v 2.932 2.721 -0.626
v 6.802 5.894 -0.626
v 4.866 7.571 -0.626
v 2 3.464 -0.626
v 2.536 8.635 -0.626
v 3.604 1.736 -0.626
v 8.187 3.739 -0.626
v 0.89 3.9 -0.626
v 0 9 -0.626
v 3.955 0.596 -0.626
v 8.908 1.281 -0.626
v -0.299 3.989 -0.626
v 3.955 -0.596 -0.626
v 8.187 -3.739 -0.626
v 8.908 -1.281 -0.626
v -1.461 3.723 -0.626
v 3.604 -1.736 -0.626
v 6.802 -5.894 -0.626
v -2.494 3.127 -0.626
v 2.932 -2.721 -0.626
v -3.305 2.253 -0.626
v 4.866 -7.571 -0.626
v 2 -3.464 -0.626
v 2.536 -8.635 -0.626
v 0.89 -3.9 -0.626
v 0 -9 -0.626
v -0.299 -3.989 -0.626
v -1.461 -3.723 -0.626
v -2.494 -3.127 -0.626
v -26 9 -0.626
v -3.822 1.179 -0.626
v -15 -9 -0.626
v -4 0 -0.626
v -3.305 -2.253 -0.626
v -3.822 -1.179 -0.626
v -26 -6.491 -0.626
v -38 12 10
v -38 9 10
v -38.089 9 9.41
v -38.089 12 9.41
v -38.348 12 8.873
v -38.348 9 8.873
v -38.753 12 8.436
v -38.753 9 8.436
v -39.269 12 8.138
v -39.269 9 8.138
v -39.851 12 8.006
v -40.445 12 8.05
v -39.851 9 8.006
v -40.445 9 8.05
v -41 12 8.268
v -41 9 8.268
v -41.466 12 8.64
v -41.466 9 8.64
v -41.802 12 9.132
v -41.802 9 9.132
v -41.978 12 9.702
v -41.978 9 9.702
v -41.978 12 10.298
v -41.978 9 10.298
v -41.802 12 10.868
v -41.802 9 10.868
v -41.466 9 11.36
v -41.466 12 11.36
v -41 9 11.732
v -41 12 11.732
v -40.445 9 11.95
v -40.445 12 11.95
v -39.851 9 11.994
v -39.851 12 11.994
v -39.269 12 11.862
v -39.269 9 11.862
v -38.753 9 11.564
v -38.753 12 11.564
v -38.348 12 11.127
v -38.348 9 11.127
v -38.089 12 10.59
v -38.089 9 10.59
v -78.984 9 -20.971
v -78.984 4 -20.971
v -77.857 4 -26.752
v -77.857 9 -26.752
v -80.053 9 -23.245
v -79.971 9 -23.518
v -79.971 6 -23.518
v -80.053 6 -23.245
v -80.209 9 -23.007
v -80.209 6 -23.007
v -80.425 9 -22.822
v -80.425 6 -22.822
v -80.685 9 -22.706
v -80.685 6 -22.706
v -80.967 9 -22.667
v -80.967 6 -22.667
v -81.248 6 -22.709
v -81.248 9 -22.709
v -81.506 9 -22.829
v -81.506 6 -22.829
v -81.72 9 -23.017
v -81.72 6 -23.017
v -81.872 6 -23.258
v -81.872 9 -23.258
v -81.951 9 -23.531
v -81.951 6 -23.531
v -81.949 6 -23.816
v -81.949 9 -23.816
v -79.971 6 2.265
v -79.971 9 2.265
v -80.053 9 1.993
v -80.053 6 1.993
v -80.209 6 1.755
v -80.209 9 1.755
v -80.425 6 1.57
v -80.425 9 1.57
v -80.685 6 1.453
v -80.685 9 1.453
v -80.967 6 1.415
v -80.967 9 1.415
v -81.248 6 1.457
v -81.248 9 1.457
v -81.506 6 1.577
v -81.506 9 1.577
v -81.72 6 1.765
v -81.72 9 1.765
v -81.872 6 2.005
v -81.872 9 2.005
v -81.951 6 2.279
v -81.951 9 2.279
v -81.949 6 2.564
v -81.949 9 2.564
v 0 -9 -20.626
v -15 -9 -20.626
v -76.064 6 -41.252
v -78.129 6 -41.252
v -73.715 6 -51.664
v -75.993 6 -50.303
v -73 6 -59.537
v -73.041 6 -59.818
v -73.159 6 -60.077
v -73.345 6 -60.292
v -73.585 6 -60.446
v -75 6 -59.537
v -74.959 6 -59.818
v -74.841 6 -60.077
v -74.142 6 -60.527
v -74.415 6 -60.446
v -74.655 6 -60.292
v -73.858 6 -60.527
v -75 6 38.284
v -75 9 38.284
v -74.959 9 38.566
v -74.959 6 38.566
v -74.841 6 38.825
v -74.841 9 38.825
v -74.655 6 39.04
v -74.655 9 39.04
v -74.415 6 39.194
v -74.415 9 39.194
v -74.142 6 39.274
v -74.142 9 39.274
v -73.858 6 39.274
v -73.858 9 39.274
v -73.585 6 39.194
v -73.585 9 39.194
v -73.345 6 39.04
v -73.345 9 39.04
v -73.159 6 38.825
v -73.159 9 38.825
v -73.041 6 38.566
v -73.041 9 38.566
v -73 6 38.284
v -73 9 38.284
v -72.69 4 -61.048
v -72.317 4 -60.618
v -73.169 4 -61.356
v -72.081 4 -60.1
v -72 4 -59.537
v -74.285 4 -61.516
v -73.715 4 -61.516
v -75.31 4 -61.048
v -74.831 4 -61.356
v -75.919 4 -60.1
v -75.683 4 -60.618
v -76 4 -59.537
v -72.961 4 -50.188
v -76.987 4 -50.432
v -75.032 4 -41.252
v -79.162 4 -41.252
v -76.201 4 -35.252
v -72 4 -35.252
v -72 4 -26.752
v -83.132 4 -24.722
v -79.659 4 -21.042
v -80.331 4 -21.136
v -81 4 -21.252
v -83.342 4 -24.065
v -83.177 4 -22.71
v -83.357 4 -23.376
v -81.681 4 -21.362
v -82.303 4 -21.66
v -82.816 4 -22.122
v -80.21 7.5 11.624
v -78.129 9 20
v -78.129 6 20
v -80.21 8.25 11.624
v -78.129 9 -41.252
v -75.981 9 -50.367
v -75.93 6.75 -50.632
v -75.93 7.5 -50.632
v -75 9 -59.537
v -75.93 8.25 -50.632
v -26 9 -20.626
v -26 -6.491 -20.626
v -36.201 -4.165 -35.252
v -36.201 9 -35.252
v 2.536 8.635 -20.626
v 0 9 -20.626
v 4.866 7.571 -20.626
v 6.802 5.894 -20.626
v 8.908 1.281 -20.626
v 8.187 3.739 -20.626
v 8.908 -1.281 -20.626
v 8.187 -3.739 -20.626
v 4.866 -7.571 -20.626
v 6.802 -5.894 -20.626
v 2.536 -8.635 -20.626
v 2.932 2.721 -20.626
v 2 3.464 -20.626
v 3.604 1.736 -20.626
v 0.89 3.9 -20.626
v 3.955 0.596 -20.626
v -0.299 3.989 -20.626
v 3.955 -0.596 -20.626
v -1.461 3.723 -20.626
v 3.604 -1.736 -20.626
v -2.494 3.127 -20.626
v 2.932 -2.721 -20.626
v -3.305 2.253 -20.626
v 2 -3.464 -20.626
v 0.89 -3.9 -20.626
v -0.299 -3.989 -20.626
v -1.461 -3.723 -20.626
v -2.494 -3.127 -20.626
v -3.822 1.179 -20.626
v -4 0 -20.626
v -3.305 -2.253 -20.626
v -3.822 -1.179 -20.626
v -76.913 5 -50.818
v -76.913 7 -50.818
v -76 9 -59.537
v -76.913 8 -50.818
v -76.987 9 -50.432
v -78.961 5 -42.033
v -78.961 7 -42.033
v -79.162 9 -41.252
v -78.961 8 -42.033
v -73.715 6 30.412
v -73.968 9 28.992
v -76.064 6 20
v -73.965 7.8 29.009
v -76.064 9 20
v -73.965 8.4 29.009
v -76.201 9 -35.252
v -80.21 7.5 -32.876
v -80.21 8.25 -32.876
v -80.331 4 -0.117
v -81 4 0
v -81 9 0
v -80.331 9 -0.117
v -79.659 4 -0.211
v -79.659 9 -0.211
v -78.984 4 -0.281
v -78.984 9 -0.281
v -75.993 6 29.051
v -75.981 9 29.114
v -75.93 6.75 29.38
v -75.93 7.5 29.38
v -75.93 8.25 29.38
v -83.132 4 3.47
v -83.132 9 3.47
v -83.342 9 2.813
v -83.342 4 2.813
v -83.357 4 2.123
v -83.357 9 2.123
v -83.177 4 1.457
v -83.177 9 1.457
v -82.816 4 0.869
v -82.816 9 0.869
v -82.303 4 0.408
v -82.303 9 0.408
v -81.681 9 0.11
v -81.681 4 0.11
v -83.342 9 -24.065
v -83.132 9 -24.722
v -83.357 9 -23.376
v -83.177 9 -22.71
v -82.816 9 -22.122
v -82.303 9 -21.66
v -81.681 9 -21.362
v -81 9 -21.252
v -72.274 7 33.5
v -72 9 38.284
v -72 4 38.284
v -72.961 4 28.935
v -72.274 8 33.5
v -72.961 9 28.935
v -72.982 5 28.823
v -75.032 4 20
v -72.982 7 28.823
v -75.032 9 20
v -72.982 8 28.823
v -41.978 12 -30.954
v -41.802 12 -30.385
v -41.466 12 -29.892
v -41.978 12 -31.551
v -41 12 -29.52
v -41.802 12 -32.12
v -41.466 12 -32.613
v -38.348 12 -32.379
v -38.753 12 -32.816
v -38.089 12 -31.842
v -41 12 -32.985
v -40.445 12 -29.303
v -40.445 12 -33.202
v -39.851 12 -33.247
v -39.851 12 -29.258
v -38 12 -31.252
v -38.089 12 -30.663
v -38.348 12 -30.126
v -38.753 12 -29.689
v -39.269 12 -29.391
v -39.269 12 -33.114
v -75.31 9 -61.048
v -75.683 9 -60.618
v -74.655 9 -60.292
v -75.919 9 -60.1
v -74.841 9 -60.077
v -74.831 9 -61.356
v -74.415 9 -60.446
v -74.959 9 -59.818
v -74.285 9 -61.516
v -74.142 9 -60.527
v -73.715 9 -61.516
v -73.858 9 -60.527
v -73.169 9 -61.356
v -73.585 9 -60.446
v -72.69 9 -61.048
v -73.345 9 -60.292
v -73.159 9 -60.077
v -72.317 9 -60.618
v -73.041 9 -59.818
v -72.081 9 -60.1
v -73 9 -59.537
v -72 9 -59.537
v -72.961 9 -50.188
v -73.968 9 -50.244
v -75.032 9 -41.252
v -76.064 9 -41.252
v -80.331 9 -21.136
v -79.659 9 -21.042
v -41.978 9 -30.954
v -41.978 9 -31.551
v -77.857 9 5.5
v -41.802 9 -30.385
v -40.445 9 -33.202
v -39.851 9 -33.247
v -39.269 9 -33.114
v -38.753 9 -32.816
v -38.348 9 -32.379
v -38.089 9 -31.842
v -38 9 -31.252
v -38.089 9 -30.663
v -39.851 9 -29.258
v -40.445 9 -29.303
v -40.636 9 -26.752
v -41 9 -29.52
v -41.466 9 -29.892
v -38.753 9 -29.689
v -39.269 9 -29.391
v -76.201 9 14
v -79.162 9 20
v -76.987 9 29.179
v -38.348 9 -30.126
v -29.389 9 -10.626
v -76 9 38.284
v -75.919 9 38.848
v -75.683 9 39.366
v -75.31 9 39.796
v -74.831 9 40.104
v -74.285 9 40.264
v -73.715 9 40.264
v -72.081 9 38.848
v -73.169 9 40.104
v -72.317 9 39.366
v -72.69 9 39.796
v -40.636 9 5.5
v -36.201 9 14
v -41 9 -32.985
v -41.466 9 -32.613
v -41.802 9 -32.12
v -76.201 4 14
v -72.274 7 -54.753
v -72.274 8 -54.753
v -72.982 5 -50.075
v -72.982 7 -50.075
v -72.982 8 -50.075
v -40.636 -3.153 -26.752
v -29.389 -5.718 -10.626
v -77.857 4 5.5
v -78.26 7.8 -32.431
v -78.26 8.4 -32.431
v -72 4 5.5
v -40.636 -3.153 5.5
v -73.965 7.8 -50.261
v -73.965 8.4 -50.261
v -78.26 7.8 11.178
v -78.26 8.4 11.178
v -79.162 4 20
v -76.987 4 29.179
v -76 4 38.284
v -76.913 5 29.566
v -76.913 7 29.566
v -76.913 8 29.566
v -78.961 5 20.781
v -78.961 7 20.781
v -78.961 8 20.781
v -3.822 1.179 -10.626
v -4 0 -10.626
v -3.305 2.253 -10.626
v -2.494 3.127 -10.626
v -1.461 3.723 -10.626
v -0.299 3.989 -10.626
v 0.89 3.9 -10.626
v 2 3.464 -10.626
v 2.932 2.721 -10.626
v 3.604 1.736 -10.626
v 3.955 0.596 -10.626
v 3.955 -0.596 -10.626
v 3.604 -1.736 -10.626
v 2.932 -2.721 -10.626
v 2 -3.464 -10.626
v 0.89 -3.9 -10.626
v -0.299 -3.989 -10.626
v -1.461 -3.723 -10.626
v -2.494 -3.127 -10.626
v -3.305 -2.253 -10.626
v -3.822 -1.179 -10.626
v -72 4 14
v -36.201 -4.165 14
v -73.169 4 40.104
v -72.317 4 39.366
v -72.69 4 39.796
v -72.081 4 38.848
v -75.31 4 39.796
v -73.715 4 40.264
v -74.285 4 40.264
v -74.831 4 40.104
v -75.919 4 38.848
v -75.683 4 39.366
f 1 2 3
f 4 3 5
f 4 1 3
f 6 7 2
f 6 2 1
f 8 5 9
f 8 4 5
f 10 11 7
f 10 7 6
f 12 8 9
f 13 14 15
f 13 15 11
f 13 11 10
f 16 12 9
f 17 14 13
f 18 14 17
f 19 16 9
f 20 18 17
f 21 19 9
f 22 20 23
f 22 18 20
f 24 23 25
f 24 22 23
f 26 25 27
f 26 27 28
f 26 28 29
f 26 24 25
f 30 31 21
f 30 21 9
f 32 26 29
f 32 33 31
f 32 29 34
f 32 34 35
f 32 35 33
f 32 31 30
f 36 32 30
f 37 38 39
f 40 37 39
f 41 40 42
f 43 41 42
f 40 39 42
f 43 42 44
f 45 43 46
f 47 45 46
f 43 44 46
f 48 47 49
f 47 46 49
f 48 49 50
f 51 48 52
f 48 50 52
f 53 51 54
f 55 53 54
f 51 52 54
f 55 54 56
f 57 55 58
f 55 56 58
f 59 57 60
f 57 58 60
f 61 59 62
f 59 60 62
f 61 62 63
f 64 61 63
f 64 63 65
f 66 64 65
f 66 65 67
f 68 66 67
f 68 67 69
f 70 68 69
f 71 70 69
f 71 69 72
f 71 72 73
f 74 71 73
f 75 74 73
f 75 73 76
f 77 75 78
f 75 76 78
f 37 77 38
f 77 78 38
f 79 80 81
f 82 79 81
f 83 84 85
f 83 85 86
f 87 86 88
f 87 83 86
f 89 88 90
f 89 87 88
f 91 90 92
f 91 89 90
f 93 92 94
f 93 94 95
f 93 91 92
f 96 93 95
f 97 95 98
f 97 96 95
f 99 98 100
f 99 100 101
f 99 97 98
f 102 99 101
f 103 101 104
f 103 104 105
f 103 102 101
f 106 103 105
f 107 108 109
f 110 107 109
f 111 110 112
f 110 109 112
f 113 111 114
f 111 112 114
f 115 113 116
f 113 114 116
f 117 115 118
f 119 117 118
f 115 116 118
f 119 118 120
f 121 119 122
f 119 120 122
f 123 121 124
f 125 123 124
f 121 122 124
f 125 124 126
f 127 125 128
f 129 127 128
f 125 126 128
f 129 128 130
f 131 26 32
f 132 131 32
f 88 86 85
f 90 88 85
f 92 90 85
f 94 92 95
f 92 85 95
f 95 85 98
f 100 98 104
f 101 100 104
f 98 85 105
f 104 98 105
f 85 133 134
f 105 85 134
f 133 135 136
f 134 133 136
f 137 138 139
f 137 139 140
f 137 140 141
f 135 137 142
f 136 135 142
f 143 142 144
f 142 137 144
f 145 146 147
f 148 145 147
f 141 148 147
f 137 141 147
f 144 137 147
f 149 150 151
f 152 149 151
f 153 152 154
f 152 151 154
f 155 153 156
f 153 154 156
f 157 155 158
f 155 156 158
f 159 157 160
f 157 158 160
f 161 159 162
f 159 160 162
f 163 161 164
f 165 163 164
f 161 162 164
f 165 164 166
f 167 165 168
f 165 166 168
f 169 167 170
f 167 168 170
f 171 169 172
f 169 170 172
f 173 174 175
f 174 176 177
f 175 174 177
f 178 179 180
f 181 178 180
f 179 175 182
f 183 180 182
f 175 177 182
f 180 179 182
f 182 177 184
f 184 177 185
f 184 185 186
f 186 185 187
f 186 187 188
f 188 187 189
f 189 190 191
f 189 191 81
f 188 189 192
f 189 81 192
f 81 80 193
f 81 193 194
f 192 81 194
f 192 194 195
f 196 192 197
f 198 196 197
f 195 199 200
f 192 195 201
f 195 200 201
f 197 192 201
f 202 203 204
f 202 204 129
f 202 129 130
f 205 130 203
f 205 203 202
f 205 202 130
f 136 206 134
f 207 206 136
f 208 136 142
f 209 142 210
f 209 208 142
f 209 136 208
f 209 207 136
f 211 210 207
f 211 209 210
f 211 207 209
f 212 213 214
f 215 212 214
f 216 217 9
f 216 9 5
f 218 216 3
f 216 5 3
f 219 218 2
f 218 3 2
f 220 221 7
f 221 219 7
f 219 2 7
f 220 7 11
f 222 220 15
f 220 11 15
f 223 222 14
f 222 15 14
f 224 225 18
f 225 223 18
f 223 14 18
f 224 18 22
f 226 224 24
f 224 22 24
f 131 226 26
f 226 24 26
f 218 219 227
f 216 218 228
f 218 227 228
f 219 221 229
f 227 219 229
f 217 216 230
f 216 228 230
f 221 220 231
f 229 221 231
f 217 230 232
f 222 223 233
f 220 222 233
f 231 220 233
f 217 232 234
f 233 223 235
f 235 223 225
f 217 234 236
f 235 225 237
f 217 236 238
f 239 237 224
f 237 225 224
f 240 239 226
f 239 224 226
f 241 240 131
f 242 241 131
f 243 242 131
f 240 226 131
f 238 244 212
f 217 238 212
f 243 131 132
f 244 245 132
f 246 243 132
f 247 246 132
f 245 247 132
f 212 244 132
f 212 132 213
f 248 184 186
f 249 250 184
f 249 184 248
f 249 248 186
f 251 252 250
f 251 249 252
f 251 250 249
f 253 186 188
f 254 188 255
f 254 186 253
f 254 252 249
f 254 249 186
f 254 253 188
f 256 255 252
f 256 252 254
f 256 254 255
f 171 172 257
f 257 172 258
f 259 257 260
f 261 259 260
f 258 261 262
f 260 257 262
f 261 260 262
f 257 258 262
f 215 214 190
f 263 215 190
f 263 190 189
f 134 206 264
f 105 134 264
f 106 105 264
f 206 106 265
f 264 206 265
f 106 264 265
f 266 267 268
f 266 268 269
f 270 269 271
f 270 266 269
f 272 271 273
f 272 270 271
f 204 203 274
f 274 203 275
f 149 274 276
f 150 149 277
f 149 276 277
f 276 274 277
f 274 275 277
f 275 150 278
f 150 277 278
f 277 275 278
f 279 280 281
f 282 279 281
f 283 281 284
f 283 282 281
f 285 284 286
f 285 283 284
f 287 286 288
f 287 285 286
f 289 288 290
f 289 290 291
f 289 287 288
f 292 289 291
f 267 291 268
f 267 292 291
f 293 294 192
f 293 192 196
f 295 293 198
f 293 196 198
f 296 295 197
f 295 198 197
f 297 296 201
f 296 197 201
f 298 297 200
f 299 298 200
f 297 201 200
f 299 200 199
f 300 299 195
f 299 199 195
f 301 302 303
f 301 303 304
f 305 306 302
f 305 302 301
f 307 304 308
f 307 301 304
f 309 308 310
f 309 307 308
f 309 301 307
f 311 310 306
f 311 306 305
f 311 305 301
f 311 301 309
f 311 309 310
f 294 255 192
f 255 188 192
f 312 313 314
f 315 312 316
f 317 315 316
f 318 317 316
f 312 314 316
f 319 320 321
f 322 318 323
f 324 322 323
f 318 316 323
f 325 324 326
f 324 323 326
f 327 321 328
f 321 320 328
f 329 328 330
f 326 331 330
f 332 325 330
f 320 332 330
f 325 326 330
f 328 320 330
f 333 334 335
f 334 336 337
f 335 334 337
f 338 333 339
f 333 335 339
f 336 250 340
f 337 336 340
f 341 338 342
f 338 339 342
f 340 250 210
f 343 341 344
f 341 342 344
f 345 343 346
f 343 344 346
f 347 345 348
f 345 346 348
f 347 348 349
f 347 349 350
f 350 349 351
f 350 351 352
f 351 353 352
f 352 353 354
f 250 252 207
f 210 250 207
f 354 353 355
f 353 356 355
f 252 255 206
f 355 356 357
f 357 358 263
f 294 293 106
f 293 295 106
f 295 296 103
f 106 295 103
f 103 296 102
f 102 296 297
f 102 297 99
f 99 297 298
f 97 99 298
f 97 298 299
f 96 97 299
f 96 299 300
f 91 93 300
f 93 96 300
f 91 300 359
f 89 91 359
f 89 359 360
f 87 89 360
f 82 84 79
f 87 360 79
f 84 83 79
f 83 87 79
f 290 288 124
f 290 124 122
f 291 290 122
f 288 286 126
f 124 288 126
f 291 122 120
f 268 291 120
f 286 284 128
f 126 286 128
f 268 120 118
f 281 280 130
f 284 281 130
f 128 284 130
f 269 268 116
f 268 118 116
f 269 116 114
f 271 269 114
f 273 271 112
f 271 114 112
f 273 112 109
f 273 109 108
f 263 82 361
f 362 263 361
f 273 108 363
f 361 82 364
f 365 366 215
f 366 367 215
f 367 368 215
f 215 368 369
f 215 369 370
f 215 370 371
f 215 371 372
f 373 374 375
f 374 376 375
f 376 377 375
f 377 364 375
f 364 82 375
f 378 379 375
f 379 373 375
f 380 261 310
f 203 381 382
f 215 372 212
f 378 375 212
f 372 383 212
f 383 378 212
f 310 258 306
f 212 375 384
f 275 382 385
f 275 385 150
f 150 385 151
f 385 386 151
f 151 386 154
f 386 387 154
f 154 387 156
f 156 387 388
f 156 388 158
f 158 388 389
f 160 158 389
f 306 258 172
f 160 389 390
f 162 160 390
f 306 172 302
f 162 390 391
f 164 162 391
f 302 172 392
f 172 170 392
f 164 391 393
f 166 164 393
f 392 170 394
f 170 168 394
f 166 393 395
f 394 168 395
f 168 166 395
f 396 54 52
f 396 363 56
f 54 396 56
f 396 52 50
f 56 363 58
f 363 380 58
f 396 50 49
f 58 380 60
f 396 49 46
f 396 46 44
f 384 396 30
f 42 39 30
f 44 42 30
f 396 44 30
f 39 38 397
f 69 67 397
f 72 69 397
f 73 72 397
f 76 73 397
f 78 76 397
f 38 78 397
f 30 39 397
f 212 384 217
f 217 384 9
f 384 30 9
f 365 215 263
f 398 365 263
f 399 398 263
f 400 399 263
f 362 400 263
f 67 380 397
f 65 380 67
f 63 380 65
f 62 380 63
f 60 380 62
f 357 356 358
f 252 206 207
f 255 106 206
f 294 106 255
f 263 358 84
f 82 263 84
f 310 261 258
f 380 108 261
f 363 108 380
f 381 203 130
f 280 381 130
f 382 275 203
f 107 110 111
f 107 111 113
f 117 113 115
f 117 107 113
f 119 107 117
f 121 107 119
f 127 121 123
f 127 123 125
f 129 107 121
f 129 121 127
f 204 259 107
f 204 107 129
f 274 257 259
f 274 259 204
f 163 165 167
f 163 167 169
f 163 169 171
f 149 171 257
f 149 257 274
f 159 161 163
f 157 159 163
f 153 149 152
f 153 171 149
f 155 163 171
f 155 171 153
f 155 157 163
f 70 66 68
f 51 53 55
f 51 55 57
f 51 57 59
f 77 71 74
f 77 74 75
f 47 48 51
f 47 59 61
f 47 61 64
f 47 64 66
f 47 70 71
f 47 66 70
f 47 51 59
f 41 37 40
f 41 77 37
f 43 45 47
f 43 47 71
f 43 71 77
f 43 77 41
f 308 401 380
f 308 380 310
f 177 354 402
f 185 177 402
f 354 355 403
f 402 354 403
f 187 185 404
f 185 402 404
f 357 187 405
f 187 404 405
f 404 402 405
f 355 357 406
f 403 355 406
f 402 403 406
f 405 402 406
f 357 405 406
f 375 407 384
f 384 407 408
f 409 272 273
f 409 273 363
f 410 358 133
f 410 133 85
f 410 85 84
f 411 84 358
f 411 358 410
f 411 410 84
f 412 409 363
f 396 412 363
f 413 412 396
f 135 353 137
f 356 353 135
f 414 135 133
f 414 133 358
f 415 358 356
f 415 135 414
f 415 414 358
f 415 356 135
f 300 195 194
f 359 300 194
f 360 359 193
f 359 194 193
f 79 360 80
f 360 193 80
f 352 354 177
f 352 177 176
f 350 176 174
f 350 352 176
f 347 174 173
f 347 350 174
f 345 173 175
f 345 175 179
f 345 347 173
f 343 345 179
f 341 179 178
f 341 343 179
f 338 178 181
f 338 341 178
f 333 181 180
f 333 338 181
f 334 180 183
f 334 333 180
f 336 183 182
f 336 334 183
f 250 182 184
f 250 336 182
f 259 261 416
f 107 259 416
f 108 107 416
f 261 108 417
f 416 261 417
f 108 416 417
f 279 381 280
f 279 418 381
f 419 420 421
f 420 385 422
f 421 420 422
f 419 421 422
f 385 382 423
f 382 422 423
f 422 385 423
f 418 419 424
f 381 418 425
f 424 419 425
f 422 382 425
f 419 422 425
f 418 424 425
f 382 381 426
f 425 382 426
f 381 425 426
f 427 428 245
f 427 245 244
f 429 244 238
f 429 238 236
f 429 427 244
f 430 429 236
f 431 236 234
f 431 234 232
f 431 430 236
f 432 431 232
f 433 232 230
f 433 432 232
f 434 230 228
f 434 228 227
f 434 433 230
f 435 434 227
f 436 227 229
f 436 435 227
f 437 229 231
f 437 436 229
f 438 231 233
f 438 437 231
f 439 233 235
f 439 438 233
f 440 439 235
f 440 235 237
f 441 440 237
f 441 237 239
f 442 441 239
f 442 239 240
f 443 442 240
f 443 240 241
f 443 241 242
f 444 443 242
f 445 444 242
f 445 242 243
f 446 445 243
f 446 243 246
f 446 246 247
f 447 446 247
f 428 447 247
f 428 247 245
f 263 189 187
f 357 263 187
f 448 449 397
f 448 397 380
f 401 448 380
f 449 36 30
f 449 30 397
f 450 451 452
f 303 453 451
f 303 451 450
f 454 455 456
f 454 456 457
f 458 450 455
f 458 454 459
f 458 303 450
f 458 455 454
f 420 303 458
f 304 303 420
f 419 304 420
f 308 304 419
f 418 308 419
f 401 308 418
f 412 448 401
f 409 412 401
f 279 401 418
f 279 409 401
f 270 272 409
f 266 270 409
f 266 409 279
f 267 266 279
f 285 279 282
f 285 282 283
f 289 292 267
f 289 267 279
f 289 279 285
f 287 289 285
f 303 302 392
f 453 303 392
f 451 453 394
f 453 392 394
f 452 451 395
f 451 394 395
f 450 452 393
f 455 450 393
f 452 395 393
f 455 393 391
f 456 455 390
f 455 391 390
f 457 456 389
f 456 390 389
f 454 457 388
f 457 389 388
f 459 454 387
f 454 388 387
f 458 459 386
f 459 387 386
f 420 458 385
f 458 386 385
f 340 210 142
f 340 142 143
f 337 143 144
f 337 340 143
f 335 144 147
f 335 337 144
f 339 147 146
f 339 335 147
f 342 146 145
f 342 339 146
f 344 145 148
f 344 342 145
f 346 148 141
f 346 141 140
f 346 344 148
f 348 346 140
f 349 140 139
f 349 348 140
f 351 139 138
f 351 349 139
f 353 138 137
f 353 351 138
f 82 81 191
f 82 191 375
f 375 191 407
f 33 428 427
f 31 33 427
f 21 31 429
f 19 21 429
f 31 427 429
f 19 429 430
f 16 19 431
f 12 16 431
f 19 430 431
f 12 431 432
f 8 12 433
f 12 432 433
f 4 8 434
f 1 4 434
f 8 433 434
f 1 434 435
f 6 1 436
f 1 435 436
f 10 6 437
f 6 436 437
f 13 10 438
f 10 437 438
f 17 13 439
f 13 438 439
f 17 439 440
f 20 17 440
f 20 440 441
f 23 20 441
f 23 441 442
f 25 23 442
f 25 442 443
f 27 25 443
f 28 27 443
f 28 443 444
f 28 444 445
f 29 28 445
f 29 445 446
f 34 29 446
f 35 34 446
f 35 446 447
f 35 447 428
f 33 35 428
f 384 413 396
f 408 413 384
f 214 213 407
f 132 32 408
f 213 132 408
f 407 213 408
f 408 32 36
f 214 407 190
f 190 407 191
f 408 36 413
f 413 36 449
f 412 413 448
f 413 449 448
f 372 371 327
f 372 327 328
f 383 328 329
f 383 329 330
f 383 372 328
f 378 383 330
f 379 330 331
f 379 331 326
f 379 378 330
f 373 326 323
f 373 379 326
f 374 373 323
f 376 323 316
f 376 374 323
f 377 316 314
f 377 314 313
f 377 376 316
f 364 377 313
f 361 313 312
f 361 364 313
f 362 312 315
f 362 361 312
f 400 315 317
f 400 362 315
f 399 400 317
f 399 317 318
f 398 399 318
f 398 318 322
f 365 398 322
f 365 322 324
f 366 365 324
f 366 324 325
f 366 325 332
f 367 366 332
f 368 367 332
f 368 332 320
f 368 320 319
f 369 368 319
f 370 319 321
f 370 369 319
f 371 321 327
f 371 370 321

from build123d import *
from build123d.topology import SkipClean

# Parameters (mm, degrees)
SKETCH1_R               = 4
BOSS_EXTRUDE1_DEPTH     = 20
SKETCH2_R               = 2
BOSS_EXTRUDE2_DEPTH     = 3
CUT_EXTRUDE1_DEPTH      = 3
BOSS_EXTRUDE3_DEPTH     = 5
CUT_EXTRUDE2_DEPTH      = 101.233839294
CUT_EXTRUDE2_DEPTH_BACK = 101.233839294
BOSS_EXTRUDE4_START     = -2
BOSS_EXTRUDE4_DEPTH     = 2
CUT_EXTRUDE3_DEPTH      = 87.641828375
CUT_EXTRUDE3_DEPTH_BACK = 87.641828375
BOSS_EXTRUDE5_START     = 30
SKETCH8_R               = 4
BOSS_EXTRUDE5_DEPTH     = 30
CUT_EXTRUDE4_DEPTH      = 95.330150438
CUT_EXTRUDE4_DEPTH_BACK = 95.330150438


with BuildPart() as part:
    # Sketch1 → Boss-Extrude1 (new body)
    with BuildSketch(Plane.XY):
        with BuildLine():
            Line((0, 9), (-90, 9))
            Line((-90, 9), (-90, -9))
            Line((-90, -9), (0, -9))
            ThreePointArc((0, -9), (9, 0), (0, 9))
        make_face()
        Circle(SKETCH1_R, mode=Mode.SUBTRACT)
    extrude(amount=BOSS_EXTRUDE1_DEPTH)

    # Sketch2 → Boss-Extrude2 (add)
    with BuildSketch(Plane(origin=(0, 9, 0), x_dir=(1, 0, 0), z_dir=(0, 1, 0))):
        with Locations((-40, -10)):
            Circle(SKETCH2_R)
    extrude(amount=BOSS_EXTRUDE2_DEPTH)

    # Sketch3 → Cut-Extrude1 (cut)
    with BuildSketch(Plane(origin=(0, 9, 0), x_dir=(1, 0, 0), z_dir=(0, 1, 0))):
        with BuildLine():
            ThreePointArc((-79.971123065, -2.265451037), (-81.109001692, -1.425669976), (-81.948782753, -2.563548603))
            add(Edge.make_bspline(
                [(-75, -38.284271372), (-75.000000372, -35.299991519), (-75.743878784, -29.368041064), (-77.978217194, -20.541251955), (-80.298698299, -11.655347435), (-81.490438214, -5.604329939), (-81.948782753, -2.563548603)],
                knots=[0, 0, 0, 0, 0.171177105, 0.342354209, 0.513531314, 0.684708419, 0.684708419, 0.684708419, 0.684708419], degree=3))
            ThreePointArc((-75, -38.284271372), (-73.999999875, -39.284271247), (-73, -38.284271123))
            add(Edge.make_bspline(
                [(-73, -38.284271123), (-73.000000195, -36.723266395), (-73.196821218, -33.592705995), (-74.160174303, -27.46140767), (-76.050190168, -20.013503037), (-78.351483402, -11.19146534), (-79.520228797, -5.256805267), (-79.971123065, -2.265451037)],
                knots=[0, 0, 0, 0, 0.085588552, 0.171177105, 0.342354209, 0.513531314, 0.684708419, 0.684708419, 0.684708419, 0.684708419], degree=3))
        make_face()
    extrude(amount=-CUT_EXTRUDE1_DEPTH, mode=Mode.SUBTRACT)

    # Sketch4 → Boss-Extrude3 (add)
    with BuildSketch(Plane(origin=(0, 9, 0), x_dir=(1, 0, 0), z_dir=(0, 1, 0))):
        with BuildLine():
            Line((-90, -10), (-90, -0.41449982))
            Line((-90, -0.41449982), (-80.959952909, -0.41449982))
            ThreePointArc((-80.959952909, -0.41449982), (-79.655383082, -0.898552075), (-78.982293221, -2.116402253))
            add(Edge.make_bspline(
                [(-72, -38.284270998), (-72.000000199, -36.686938926), (-72.201891338, -33.476167151), (-73.182332484, -27.246191739), (-75.086106556, -19.748762966), (-77.377895983, -10.95977161), (-78.535124088, -5.083042932), (-78.982293221, -2.116402253)],
                knots=[0, 0, 0, 0, 0.085588552, 0.171177105, 0.342354209, 0.513531314, 0.684708419, 0.684708419, 0.684708419, 0.684708419], degree=3))
            ThreePointArc((-72, -38.284270998), (-73.99999975, -40.284271247), (-76, -38.284271497))
            add(Edge.make_bspline(
                [(-76, -38.284271497), (-76.000000181, -36.832248759), (-76.181610857, -33.942322546), (-77.093699759, -28.107055454), (-78.942441004, -20.807723253), (-80.653811295, -14.254625868), (-81.461843141, -10.616938278), (-81.594497194, -10)],
                knots=[0, 0, 0, 0, 0.085588552, 0.171177105, 0.342354209, 0.513531314, 0.548394238, 0.548394238, 0.548394238, 0.548394238], degree=3))
            Line((-81.594497194, -10), (-90, -10))
        make_face()
        with BuildLine():
            ThreePointArc((-75, -38.284271372), (-73.999999875, -39.284271247), (-73, -38.284271123))
            add(Edge.make_bspline(
                [(-73, -38.284271123), (-73.000000195, -36.723266395), (-73.196821218, -33.592705995), (-74.160174303, -27.46140767), (-76.050190168, -20.013503037), (-78.351483402, -11.19146534), (-79.520228797, -5.256805267), (-79.971123065, -2.265451037)],
                knots=[0, 0, 0, 0, 0.085588552, 0.171177105, 0.342354209, 0.513531314, 0.684708419, 0.684708419, 0.684708419, 0.684708419], degree=3))
            ThreePointArc((-79.971123065, -2.265451037), (-81.109001692, -1.425669976), (-81.948782753, -2.563548603))
            add(Edge.make_bspline(
                [(-81.948782753, -2.563548603), (-81.490438214, -5.604329939), (-80.298698299, -11.655347435), (-77.978217194, -20.541251955), (-75.743878784, -29.368041064), (-75.000000372, -35.299991519), (-75, -38.284271372)],
                knots=[0, 0, 0, 0, 0.171177105, 0.342354209, 0.513531314, 0.684708419, 0.684708419, 0.684708419, 0.684708419], degree=3))
        make_face(mode=Mode.SUBTRACT)
    extrude(amount=-BOSS_EXTRUDE3_DEPTH)

    # Sketch5 → Cut-Extrude2 (cut, two sides: drawn at the far end of the back side and taken through both)
    with BuildSketch(Plane(origin=(0, 9, 0), x_dir=(1, 0, 0), z_dir=(0, 1, 0)).offset(-CUT_EXTRUDE2_DEPTH_BACK)):
        with BuildLine():
            Line((-79.162032771, -19.999999885), (-83.13188577, -3.470019027))
            ThreePointArc((-83.13188577, -3.470019027), (-83.017493149, -1.150402786), (-81, 0))
            Line((-81, 0), (-90, 0))
            Line((-90, 0), (-90, -20))
            Line((-90, -20), (-79.162032771, -19.999999885))
        make_face()
    extrude(amount=CUT_EXTRUDE2_DEPTH + CUT_EXTRUDE2_DEPTH_BACK, mode=Mode.SUBTRACT)

    # Sketch6 → Boss-Extrude4 (add)
    with BuildSketch(Plane.XZ.offset(-4).offset(BOSS_EXTRUDE4_START)):
        with BuildLine():
            Line((-76.064161018, 20), (-78.129327832, 20))
            Line((-78.129327832, 20), (-79.162032327, 19.999999771))
            add(Edge.make_bspline(
                [(-76, 38.284271497), (-76.000000181, 36.832248759), (-76.181610857, 33.942322546), (-77.093699759, 28.107055454), (-78.268200121, 23.469809255), (-79.0949235, 20.260458438), (-79.162032327, 19.999999771)],
                knots=[0.190934795, 0.190934795, 0.190934795, 0.190934795, 0.276523348, 0.3621119, 0.533289005, 0.548394238, 0.548394238, 0.548394238, 0.548394238], degree=3))
            ThreePointArc((-76, 38.284271497), (-73.99999975, 40.284271247), (-72, 38.284270998))
            add(Edge.make_bspline(
                [(-75.031610496, 20.00000001), (-74.287622469, 22.893815084), (-73.170396852, 27.32203382), (-72.201891338, 33.476167151), (-72.000000199, 36.686938926), (-72, 38.284270998)],
                knots=[0, 0, 0, 0, 0.167009375, 0.252597927, 0.338186479, 0.338186479, 0.338186479, 0.338186479], degree=3))
            Line((-75.031610496, 20.00000001), (-76.064161018, 20))
        make_face()
    extrude(amount=BOSS_EXTRUDE4_DEPTH)

    # Sketch7 → Cut-Extrude3 (cut, two sides: drawn at the far end of the back side and taken through both)
    with BuildSketch(Plane.XY.offset(20).offset(-CUT_EXTRUDE3_DEPTH_BACK)):
        Polygon((-72, -21), (-15, -9), (-72, 4), (-92, 4), (-92, -21), align=None)
    extrude(amount=CUT_EXTRUDE3_DEPTH + CUT_EXTRUDE3_DEPTH_BACK, mode=Mode.SUBTRACT)

    # Sketch8 → Boss-Extrude5 (add)
    with SkipClean():  # the faces are left unmerged after this step: merging them gives an invalid solid
        with BuildSketch(Plane(origin=(0, 0, 0), x_dir=(-1, 0, 0), z_dir=(0, 0, -1)).offset(BOSS_EXTRUDE5_START)):
            with BuildLine():
                Line((15, -9), (72, 4))
                Line((72, 4), (81, 4))
                Line((81, 4), (81, 9))
                Line((81, 9), (0, 9))
                ThreePointArc((0, 9), (-9, 0), (0, -9))
                Line((0, -9), (15, -9))
            make_face()
            Circle(SKETCH8_R, mode=Mode.SUBTRACT)
        extrude(amount=-BOSS_EXTRUDE5_DEPTH)

    # Sketch9 → Cut-Extrude4 (cut, two sides: drawn at the far end of the back side and taken through both)
    with BuildSketch(Plane(origin=(0, 9, 0), x_dir=(1, 0, 0), z_dir=(0, 1, 0)).offset(-CUT_EXTRUDE4_DEPTH_BACK)):
        with BuildLine():
            Line((9, 0.626236109), (-26, 0.626236109))
            Line((-26, 0.626236109), (-36.200880428, -14.00000001))
            Line((-36.200880428, -14.00000001), (-76.200880428, -14.00000001))
            Line((-76.200880428, -14.00000001), (-75.031610496, -20.00000001))
            Line((-75.031610496, -20.00000001), (16, -20.00000001))
            Line((16, -20.00000001), (16, 10.626236109))
            Line((16, 10.626236109), (16, 30))
            Line((16, 30), (-81, 30))
            Line((-81, 30), (-81, 0))
            ThreePointArc((-81, 0), (-79.99562938, 0.16672565), (-78.983962224, 0.281125602))
            Line((-78.983962224, 0.281125602), (-77.857346165, -5.50000001))
            Line((-77.857346165, -5.50000001), (-40.635759862, -5.50000001))
            Line((-40.635759862, -5.50000001), (-29.388723709, 10.626236109))
            Line((-29.388723709, 10.626236109), (9, 10.626236109))
            Line((9, 10.626236109), (9, 0.626236109))
        make_face()
    extrude(amount=CUT_EXTRUDE4_DEPTH + CUT_EXTRUDE4_DEPTH_BACK, mode=Mode.SUBTRACT)

    # Mirror1: part across plane


with BuildPart() as part_1:
    add(part.part)
    add(part.part.mirror(Plane(origin=(9, -9, -10.626236109), x_dir=(1, 0, 0), z_dir=(0, 0, 1))))


solid = part_1.part
